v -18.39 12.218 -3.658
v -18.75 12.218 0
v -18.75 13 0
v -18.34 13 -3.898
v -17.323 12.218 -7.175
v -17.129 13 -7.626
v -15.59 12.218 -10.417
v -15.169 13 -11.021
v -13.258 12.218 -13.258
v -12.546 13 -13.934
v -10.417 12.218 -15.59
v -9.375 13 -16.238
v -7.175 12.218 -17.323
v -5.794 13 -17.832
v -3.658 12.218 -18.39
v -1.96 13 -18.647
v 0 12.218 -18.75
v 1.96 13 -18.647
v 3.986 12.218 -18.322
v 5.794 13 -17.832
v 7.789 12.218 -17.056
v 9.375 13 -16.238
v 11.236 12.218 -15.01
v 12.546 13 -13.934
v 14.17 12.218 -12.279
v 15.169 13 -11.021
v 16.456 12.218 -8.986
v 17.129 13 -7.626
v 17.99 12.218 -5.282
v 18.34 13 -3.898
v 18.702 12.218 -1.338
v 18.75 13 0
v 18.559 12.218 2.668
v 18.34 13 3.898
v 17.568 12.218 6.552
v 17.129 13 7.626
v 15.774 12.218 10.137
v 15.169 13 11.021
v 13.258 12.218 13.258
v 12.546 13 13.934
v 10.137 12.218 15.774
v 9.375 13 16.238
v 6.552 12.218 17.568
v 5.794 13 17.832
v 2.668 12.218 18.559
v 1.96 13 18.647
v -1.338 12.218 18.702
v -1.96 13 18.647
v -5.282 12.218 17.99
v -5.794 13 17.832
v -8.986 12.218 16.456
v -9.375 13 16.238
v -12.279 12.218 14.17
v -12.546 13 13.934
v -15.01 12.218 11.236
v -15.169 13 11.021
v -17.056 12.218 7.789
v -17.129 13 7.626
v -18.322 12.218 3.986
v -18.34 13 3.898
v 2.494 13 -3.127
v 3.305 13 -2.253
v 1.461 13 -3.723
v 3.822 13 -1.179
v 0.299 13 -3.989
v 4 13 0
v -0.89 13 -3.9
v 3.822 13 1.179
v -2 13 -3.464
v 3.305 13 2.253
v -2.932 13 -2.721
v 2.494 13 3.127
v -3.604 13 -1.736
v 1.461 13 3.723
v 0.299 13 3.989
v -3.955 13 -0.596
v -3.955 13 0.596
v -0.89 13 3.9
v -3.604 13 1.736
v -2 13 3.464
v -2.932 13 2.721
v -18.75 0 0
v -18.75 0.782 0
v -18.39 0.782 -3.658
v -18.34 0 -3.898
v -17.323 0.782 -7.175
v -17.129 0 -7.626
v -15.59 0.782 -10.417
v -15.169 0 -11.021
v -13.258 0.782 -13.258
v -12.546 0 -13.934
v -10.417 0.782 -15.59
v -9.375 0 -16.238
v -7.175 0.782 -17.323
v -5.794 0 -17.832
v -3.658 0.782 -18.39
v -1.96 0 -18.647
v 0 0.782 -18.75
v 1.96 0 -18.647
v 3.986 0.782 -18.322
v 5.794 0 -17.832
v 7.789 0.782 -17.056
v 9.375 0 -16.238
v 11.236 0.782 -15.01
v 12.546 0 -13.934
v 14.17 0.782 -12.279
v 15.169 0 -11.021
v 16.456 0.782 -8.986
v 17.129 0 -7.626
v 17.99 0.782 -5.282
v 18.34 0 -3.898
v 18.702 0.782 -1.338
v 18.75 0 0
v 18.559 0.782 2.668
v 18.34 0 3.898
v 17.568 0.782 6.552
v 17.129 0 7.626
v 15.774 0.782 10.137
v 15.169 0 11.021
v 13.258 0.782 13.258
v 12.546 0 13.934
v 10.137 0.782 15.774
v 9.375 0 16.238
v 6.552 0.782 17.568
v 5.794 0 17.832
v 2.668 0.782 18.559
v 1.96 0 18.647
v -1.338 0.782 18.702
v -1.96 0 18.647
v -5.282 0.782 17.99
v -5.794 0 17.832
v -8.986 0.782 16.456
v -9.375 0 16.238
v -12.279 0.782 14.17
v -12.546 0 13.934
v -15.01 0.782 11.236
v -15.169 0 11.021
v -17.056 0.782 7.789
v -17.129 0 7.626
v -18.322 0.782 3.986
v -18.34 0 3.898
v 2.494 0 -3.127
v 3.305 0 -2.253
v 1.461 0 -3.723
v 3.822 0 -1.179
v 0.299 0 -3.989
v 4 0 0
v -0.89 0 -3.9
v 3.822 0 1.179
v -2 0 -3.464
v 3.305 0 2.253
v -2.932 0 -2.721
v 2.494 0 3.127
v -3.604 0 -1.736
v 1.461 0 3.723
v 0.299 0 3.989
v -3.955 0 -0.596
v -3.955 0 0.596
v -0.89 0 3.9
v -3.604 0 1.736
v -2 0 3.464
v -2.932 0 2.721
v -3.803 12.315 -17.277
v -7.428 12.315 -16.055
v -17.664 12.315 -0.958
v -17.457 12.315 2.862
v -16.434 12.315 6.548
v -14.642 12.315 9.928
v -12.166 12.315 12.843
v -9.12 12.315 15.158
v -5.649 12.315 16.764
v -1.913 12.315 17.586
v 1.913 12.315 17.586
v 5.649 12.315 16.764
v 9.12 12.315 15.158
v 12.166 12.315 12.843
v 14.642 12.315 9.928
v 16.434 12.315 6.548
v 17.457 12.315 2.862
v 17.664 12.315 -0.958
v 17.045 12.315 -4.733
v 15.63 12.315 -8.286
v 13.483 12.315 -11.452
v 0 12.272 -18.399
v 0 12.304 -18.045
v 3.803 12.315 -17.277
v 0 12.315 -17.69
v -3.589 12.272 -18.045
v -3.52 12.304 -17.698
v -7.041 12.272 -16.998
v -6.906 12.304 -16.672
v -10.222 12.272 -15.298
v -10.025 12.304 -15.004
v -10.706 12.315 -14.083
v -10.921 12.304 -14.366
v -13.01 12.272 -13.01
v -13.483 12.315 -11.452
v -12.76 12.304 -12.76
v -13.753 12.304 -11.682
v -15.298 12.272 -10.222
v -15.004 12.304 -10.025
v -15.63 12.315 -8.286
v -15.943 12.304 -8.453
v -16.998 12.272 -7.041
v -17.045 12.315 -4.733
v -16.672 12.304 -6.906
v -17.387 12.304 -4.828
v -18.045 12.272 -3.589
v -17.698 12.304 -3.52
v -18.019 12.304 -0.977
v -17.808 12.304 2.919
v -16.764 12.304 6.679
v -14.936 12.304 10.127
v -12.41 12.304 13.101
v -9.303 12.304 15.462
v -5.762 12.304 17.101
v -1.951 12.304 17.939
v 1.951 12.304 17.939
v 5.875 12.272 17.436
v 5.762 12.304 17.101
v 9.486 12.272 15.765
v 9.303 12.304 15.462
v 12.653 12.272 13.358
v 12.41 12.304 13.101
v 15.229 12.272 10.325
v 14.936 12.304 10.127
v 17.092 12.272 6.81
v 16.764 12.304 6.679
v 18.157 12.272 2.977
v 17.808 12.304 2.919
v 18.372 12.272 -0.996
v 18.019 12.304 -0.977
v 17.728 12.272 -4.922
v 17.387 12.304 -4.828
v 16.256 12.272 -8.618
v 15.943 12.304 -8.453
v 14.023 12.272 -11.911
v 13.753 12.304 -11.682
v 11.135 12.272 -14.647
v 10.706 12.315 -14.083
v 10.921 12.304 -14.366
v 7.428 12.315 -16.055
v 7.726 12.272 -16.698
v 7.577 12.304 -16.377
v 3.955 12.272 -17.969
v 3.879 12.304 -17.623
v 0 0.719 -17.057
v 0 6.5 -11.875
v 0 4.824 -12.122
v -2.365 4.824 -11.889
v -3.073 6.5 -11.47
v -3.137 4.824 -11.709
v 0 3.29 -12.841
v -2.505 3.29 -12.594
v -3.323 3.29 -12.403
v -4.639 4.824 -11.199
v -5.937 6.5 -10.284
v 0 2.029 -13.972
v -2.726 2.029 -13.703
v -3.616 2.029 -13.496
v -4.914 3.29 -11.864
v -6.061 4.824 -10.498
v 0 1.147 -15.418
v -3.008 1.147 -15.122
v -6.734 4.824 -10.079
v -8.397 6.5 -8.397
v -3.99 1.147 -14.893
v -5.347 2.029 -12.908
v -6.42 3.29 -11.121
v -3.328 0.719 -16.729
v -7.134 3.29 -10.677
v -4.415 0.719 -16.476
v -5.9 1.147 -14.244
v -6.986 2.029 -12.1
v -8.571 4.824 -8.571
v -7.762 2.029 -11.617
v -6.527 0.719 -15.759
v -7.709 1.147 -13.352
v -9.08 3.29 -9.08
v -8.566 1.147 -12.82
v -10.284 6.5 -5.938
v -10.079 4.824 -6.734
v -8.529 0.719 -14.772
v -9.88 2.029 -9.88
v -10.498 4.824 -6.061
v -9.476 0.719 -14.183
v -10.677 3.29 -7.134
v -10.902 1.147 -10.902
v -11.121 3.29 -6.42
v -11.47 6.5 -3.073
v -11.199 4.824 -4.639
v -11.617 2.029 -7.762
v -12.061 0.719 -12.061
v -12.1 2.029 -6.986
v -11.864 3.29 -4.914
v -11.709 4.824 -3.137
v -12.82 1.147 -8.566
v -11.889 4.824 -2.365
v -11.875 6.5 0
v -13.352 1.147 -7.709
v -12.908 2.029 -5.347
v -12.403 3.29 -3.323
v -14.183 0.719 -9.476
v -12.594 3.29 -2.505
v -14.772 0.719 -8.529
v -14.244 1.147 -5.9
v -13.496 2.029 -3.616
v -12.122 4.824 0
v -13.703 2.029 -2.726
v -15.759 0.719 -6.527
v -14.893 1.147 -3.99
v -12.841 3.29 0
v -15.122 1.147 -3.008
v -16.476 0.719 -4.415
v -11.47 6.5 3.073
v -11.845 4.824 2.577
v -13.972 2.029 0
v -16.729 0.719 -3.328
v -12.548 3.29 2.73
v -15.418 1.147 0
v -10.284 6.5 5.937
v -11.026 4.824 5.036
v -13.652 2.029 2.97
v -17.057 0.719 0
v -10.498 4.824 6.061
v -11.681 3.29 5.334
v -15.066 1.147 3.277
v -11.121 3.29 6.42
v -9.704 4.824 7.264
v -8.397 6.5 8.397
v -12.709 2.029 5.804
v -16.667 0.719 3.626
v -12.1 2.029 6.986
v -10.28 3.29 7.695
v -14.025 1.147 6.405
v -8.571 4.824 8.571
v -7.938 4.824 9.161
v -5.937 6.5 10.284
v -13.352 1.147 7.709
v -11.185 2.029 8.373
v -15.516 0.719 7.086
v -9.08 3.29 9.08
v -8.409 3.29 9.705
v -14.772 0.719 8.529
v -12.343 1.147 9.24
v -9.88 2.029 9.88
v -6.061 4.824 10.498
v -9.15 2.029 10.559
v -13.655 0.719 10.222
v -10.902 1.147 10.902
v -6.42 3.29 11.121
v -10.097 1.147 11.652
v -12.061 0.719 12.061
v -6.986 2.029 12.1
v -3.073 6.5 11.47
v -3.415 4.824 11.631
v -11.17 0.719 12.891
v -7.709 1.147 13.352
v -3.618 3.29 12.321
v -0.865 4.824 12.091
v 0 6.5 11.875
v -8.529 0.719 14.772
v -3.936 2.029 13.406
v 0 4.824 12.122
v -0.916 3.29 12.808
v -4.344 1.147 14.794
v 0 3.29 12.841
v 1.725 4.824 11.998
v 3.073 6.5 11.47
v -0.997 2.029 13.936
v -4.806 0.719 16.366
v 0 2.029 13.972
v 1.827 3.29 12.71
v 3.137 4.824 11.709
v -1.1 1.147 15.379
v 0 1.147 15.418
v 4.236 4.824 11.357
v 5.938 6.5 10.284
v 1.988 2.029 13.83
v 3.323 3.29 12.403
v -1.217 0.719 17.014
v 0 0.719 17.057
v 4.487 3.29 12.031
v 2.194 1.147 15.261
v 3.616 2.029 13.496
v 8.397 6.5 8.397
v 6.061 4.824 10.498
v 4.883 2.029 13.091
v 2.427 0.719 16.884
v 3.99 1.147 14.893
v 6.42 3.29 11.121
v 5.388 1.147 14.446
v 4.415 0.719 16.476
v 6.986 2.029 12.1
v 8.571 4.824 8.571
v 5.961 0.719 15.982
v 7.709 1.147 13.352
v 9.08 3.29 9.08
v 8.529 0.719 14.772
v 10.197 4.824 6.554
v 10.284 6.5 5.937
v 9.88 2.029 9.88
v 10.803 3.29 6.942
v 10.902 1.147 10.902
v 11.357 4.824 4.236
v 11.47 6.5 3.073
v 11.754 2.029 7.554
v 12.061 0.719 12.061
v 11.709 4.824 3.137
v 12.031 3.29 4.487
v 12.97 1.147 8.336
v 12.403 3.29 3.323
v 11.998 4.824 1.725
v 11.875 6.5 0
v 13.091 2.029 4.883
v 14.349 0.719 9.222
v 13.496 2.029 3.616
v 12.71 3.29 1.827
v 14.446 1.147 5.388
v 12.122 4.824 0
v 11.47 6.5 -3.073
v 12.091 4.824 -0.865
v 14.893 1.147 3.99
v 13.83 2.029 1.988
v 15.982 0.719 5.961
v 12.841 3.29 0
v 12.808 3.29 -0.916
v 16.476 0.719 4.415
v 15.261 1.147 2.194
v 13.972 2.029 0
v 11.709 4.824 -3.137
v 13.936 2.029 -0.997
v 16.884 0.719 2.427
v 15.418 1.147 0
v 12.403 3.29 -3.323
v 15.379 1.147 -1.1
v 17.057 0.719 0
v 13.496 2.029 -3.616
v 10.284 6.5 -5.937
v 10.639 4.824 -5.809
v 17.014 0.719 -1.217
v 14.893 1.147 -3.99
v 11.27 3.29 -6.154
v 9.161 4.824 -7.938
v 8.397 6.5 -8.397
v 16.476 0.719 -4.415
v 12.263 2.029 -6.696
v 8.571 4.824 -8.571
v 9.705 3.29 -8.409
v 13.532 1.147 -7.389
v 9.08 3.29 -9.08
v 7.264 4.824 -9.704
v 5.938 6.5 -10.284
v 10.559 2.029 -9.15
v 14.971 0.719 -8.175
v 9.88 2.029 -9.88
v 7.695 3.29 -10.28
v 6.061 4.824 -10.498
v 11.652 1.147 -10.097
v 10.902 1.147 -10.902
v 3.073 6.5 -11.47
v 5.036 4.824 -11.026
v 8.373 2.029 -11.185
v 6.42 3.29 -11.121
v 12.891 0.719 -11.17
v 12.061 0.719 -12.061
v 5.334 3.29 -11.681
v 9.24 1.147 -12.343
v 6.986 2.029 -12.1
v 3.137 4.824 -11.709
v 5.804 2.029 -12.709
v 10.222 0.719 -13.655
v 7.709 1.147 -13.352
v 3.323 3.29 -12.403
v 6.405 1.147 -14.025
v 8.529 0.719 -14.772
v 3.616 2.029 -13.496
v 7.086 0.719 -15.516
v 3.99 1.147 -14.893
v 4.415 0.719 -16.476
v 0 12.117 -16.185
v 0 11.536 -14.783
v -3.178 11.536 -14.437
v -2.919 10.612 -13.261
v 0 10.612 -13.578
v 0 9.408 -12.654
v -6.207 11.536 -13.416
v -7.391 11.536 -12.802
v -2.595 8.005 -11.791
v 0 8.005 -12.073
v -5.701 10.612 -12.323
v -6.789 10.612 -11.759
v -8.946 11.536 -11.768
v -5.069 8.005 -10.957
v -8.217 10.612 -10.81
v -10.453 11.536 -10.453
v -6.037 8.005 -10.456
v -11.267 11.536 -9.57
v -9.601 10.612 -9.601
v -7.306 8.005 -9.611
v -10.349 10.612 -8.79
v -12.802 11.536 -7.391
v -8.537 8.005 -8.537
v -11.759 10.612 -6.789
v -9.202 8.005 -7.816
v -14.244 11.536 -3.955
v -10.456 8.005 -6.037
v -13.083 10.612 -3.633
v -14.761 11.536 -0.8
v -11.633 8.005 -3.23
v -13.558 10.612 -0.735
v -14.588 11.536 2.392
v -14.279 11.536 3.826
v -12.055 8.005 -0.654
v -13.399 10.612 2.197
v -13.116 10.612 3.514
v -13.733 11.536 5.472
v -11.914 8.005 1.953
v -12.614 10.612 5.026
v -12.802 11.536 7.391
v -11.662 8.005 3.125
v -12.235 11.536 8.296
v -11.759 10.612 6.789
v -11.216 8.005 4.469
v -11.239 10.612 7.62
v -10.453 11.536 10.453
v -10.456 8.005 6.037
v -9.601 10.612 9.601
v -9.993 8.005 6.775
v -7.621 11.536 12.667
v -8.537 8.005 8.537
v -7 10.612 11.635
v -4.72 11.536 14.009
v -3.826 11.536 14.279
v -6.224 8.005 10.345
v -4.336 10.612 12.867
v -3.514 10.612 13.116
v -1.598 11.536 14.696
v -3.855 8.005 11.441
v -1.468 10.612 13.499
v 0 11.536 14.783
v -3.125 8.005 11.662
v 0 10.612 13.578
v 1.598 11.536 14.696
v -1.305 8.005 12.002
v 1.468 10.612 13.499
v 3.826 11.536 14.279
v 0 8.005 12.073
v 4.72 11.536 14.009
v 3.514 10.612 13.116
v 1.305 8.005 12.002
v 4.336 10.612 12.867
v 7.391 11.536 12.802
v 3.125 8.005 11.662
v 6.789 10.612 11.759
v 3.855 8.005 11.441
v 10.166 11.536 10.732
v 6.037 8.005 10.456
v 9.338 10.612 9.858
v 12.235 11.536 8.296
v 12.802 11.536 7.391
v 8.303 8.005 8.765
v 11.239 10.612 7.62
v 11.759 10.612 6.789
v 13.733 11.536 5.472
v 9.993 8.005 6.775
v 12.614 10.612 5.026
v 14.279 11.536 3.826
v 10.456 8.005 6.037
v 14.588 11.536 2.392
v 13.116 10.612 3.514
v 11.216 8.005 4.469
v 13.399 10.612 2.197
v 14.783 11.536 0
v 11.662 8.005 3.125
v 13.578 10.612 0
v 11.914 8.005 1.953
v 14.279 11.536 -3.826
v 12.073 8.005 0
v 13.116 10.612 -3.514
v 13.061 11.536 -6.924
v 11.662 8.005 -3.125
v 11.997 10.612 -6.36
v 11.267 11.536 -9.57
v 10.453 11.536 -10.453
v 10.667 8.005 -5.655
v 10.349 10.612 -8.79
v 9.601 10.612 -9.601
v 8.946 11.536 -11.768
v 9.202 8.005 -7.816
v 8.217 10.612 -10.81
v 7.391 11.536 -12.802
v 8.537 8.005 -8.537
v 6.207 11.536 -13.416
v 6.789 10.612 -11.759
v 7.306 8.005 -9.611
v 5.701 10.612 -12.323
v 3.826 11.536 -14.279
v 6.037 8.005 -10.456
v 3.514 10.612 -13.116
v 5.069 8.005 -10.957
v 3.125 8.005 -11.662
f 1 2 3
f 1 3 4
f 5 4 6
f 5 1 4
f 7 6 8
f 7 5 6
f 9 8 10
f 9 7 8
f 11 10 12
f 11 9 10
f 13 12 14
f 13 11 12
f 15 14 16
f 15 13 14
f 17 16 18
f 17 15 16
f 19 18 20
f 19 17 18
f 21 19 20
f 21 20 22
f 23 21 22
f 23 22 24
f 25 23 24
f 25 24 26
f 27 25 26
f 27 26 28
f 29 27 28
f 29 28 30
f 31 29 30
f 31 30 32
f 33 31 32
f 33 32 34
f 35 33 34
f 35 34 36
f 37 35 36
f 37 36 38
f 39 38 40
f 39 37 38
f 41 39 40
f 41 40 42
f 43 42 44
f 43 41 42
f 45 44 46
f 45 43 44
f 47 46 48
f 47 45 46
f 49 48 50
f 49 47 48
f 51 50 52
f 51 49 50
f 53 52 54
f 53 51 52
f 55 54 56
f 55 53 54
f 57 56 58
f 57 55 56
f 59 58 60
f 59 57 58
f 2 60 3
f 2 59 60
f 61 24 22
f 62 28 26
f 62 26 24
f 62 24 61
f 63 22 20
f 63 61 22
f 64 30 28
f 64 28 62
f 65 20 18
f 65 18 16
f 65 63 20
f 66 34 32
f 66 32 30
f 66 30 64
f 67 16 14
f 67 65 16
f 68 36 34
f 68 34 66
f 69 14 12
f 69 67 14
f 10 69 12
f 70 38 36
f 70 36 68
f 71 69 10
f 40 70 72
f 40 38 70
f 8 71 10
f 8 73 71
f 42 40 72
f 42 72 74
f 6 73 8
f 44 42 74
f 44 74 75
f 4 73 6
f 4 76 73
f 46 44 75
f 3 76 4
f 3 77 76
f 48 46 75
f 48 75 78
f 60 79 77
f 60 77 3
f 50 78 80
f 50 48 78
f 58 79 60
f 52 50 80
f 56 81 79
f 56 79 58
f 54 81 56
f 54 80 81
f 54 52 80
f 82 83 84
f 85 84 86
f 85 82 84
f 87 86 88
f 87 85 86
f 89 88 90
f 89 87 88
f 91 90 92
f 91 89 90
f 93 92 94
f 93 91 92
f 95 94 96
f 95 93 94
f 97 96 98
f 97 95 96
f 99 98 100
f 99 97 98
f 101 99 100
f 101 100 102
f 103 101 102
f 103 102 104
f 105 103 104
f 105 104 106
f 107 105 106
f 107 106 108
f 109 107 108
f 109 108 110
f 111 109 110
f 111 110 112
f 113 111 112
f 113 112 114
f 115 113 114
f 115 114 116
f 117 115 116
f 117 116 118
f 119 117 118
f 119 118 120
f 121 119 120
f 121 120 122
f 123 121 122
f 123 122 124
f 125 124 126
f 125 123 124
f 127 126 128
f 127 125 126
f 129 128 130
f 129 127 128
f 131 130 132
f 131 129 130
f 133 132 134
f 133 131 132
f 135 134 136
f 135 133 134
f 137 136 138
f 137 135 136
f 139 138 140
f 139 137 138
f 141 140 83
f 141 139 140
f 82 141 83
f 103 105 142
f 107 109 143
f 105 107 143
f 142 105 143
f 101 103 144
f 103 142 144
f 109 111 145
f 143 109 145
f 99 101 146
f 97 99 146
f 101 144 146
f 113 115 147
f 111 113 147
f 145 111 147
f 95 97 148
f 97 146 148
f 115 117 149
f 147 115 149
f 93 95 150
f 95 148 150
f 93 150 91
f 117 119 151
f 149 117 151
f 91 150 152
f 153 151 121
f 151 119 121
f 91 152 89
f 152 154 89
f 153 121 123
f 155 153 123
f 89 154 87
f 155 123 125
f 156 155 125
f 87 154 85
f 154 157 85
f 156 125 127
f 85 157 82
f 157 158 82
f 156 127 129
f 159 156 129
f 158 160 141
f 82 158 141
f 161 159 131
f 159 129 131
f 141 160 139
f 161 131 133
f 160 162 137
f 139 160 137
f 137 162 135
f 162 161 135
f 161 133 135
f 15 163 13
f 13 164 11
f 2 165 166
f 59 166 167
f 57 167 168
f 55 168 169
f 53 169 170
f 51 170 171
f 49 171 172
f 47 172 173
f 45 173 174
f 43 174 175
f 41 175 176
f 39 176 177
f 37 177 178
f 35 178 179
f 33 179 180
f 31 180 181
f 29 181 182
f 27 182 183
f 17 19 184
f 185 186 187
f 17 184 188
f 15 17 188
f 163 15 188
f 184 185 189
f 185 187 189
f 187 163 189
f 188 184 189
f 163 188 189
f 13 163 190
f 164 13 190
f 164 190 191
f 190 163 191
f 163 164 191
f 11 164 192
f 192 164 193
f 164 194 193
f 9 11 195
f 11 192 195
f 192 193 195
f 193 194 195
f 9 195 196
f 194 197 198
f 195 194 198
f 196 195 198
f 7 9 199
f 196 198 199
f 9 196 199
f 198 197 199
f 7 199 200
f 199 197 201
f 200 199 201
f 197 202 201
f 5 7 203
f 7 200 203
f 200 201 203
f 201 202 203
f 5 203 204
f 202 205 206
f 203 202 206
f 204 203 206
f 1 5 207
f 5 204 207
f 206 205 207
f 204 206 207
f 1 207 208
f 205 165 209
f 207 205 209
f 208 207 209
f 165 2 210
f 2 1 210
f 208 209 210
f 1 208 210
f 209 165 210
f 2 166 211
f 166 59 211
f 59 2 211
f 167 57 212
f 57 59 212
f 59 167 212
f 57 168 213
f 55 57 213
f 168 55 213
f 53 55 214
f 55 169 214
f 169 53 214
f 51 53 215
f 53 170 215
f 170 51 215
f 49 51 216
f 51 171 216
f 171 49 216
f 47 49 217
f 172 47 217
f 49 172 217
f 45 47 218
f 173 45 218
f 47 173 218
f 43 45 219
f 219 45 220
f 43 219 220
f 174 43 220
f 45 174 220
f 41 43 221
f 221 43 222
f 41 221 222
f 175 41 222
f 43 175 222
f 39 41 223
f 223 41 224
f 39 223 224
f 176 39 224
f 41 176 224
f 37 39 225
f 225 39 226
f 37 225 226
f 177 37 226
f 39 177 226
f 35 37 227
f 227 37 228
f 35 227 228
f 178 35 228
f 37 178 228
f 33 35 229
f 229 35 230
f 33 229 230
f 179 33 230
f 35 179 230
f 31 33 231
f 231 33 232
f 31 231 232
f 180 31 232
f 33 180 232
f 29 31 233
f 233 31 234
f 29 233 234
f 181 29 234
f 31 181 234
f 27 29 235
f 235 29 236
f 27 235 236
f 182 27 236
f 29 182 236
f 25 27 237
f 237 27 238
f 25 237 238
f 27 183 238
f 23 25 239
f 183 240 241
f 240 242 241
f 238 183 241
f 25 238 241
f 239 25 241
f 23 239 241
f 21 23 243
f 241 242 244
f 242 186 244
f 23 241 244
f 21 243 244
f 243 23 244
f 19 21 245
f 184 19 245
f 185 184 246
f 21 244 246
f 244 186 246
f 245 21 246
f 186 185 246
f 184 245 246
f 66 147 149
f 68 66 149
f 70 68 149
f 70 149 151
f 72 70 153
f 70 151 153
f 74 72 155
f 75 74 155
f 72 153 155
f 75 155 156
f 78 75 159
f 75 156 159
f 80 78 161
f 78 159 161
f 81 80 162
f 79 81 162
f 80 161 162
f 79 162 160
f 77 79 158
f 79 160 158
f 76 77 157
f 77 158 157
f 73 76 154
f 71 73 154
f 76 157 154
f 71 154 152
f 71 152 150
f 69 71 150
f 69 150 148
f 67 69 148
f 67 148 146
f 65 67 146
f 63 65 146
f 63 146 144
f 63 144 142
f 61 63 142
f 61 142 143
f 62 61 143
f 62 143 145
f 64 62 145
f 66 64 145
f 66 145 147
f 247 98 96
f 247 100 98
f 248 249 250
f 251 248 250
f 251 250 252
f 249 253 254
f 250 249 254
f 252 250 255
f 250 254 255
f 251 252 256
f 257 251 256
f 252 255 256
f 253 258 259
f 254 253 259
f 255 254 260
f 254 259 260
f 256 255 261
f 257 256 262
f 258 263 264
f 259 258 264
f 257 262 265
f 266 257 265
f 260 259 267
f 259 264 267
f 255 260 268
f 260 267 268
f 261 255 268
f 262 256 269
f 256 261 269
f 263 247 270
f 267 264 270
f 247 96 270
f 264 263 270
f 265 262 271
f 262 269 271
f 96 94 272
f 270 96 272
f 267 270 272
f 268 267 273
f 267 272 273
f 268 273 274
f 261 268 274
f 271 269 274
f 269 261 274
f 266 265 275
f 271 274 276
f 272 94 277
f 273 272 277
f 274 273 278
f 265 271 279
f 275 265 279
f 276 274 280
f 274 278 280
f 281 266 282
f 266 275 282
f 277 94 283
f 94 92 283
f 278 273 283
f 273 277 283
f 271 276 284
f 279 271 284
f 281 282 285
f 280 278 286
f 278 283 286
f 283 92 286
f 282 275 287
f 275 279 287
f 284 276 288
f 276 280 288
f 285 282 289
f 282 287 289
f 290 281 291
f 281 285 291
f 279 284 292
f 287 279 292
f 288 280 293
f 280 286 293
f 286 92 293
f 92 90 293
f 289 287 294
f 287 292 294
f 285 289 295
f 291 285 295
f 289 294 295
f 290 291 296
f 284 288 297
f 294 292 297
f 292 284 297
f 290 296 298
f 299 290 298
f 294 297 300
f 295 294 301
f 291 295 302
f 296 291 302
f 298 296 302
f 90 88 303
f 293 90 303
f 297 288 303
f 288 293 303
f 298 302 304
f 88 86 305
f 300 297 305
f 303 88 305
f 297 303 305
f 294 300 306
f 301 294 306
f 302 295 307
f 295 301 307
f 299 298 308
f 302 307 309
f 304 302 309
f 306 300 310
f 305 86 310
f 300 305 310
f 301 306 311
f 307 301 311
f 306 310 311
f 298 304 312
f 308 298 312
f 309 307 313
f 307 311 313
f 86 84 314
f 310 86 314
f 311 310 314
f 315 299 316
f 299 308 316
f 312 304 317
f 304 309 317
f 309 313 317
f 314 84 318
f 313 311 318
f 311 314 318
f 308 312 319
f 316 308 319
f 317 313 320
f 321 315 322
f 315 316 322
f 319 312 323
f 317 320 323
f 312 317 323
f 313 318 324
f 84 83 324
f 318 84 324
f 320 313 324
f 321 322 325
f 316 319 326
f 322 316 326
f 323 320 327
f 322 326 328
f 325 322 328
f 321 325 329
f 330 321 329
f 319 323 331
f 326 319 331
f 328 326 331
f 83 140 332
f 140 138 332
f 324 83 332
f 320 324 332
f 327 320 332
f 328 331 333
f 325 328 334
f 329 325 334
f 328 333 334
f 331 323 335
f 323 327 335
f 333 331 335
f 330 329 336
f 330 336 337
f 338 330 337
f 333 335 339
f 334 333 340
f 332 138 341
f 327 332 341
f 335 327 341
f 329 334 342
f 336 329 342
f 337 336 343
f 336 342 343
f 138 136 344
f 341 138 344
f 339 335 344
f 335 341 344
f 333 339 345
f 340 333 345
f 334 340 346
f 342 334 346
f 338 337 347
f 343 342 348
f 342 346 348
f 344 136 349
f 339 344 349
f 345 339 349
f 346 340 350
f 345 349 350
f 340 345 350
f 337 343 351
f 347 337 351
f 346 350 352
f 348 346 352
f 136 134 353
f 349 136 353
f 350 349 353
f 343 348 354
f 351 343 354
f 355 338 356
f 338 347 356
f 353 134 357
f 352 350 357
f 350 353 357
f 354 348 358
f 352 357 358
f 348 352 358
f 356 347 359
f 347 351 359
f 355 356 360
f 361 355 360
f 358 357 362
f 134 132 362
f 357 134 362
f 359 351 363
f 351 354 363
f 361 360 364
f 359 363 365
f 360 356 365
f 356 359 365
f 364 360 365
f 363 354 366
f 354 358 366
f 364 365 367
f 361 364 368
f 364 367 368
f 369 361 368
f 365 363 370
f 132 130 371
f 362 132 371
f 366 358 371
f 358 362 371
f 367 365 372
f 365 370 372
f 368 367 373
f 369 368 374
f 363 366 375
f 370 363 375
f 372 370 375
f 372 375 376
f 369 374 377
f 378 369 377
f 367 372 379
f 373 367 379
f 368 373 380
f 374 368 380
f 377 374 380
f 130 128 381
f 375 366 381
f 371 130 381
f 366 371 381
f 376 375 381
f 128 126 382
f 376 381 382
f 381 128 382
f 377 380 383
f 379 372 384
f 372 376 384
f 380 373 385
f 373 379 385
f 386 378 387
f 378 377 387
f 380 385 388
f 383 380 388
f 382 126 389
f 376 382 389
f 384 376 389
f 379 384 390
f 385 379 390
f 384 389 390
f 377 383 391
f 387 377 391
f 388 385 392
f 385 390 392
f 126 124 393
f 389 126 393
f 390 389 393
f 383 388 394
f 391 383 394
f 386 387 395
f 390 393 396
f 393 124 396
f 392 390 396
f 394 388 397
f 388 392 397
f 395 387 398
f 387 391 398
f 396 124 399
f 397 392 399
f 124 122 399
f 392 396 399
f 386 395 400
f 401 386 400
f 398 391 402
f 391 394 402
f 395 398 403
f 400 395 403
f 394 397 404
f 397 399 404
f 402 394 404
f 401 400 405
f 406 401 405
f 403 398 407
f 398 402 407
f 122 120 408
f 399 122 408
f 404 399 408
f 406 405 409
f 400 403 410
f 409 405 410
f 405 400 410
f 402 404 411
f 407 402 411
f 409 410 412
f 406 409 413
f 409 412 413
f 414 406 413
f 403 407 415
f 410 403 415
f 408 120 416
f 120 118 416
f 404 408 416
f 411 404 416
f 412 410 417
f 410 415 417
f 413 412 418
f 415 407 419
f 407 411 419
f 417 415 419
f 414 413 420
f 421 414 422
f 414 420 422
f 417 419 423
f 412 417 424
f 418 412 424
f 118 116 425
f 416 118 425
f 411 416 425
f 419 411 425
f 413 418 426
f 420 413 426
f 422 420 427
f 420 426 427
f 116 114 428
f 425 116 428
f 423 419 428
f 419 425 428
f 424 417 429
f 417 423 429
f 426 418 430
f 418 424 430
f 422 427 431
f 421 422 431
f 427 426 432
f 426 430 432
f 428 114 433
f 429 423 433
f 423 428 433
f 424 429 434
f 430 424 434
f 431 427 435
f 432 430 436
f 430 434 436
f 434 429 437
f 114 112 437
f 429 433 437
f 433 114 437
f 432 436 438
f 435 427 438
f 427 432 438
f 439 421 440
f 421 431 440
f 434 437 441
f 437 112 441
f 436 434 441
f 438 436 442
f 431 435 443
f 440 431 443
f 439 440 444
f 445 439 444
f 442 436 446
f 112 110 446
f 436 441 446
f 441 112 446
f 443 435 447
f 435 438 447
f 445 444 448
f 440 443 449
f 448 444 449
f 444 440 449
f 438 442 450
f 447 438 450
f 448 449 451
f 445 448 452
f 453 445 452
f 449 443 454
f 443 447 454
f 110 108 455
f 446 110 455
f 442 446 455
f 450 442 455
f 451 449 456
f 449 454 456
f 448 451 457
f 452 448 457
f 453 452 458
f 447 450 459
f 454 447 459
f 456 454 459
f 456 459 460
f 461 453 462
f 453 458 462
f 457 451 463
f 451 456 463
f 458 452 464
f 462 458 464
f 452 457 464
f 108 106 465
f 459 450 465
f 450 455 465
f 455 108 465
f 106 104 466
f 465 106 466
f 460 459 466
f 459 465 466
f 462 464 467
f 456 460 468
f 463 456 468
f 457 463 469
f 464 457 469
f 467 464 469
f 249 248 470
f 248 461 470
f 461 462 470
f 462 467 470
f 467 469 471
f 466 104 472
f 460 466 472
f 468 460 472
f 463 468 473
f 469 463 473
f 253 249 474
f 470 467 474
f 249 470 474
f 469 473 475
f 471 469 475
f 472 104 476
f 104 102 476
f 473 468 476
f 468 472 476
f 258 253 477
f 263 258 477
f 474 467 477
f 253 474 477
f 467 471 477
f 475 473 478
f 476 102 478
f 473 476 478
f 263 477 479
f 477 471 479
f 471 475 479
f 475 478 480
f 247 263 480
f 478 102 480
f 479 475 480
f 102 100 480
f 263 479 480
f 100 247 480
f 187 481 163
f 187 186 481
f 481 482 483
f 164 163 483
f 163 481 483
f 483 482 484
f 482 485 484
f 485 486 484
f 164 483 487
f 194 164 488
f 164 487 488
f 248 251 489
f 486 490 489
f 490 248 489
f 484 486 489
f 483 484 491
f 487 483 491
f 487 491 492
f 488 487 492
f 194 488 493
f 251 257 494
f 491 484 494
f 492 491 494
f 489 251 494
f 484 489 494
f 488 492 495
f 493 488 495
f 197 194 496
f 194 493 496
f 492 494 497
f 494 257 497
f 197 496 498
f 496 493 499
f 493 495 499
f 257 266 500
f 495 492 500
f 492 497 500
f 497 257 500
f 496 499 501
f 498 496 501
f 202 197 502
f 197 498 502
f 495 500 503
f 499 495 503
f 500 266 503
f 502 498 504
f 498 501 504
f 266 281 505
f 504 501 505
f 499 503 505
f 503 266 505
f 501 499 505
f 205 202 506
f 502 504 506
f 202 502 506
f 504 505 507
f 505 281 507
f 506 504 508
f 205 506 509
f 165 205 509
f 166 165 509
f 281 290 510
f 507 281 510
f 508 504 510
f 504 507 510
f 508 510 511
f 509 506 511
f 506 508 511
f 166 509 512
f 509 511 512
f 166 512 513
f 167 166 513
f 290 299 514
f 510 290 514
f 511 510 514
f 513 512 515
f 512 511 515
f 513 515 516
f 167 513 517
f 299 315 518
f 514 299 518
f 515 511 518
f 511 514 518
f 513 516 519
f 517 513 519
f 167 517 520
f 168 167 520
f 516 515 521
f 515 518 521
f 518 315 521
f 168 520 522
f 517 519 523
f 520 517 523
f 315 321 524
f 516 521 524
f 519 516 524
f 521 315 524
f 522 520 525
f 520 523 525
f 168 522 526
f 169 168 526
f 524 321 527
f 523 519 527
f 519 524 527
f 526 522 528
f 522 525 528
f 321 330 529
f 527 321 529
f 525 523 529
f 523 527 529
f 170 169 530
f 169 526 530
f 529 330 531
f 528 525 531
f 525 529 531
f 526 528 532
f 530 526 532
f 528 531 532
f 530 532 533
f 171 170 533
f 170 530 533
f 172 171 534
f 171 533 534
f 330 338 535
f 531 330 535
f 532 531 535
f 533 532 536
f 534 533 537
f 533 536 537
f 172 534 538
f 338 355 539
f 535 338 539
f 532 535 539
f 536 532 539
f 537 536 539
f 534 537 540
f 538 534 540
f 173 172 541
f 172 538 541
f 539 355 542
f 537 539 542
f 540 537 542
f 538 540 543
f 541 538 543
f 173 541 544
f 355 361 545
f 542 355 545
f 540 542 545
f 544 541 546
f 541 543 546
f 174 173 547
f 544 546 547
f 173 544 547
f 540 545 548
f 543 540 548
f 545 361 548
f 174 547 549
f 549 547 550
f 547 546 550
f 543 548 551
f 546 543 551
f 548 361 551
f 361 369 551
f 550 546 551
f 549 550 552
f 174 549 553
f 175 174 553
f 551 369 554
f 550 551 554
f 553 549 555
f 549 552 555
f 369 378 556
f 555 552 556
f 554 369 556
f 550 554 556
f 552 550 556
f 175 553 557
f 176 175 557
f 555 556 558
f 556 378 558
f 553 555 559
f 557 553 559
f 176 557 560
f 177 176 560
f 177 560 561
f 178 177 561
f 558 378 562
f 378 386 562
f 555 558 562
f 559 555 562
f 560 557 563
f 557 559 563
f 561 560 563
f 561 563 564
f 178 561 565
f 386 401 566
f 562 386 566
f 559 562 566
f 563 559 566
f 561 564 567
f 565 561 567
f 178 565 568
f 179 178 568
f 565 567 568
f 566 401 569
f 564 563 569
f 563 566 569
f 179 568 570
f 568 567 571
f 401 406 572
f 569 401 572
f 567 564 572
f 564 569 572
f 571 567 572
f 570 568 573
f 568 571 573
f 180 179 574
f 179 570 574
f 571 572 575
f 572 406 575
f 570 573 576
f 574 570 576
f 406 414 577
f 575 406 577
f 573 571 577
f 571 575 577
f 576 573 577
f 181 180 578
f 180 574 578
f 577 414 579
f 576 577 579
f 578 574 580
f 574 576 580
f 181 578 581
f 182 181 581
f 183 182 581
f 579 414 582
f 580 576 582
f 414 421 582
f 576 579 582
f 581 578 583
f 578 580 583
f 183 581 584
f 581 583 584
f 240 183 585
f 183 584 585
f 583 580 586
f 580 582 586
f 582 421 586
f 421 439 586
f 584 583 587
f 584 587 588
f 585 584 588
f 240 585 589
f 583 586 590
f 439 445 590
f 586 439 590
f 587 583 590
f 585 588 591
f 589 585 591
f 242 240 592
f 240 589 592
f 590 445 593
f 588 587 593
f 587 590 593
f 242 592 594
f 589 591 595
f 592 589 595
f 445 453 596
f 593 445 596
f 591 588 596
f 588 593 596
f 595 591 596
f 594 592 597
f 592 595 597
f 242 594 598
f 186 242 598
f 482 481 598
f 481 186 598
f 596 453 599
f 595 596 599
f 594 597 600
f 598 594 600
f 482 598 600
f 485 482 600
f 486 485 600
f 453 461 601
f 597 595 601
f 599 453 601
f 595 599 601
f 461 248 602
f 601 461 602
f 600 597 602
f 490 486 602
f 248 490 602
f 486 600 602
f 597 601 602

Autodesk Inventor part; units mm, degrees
ref_plane "YZ Plane" through (0, 0, 0) normal (1, 0, 0) x (0, 1, 0)
ref_plane "XZ Plane" through (0, 0, 0) normal (0, 1, 0) x (-1, 0, 0)
ref_plane "XY Plane" through (0, 0, 0) normal (0, 0, 1) x (1, 0, 0)
sketch "Sketch1" plane through (0, 0, 0) normal (0, 1, 0) x (-1, 0, 0)
  circle A0 centre (0, 0) radius 18.75
  dimension "d0" = 37.5
extrude "Extrusion1" add sketch "Sketch1" along normal blind 13
sketch "Sketch2" plane through (0, 0, 0) normal (1, 0, 0) x (0, 1, 0)
  line L0 (0, 0) -> (6.5, 0)
  line L1 (6.5, 0) -> (6.5, -11.875)
  circle A0 centre (6.5, -17.6902) radius 5.8152
  dimension "d3" = 6.5
  dimension "d4" = 11.875
revolve "Revolution1" cut sketch "Sketch2" angle 360 about axis through (0, 0, 0) along (0, 1, 0)
sketch "Sketch3" plane through (0, 0, 0) normal (0, -1, 0) x (1, 0, 0)
  circle A0 centre (0, 0) radius 4
  dimension "d6" = 8
extrude "Extrusion2" cut sketch "Sketch3" against normal through all
properties part number "pulleybearing"
